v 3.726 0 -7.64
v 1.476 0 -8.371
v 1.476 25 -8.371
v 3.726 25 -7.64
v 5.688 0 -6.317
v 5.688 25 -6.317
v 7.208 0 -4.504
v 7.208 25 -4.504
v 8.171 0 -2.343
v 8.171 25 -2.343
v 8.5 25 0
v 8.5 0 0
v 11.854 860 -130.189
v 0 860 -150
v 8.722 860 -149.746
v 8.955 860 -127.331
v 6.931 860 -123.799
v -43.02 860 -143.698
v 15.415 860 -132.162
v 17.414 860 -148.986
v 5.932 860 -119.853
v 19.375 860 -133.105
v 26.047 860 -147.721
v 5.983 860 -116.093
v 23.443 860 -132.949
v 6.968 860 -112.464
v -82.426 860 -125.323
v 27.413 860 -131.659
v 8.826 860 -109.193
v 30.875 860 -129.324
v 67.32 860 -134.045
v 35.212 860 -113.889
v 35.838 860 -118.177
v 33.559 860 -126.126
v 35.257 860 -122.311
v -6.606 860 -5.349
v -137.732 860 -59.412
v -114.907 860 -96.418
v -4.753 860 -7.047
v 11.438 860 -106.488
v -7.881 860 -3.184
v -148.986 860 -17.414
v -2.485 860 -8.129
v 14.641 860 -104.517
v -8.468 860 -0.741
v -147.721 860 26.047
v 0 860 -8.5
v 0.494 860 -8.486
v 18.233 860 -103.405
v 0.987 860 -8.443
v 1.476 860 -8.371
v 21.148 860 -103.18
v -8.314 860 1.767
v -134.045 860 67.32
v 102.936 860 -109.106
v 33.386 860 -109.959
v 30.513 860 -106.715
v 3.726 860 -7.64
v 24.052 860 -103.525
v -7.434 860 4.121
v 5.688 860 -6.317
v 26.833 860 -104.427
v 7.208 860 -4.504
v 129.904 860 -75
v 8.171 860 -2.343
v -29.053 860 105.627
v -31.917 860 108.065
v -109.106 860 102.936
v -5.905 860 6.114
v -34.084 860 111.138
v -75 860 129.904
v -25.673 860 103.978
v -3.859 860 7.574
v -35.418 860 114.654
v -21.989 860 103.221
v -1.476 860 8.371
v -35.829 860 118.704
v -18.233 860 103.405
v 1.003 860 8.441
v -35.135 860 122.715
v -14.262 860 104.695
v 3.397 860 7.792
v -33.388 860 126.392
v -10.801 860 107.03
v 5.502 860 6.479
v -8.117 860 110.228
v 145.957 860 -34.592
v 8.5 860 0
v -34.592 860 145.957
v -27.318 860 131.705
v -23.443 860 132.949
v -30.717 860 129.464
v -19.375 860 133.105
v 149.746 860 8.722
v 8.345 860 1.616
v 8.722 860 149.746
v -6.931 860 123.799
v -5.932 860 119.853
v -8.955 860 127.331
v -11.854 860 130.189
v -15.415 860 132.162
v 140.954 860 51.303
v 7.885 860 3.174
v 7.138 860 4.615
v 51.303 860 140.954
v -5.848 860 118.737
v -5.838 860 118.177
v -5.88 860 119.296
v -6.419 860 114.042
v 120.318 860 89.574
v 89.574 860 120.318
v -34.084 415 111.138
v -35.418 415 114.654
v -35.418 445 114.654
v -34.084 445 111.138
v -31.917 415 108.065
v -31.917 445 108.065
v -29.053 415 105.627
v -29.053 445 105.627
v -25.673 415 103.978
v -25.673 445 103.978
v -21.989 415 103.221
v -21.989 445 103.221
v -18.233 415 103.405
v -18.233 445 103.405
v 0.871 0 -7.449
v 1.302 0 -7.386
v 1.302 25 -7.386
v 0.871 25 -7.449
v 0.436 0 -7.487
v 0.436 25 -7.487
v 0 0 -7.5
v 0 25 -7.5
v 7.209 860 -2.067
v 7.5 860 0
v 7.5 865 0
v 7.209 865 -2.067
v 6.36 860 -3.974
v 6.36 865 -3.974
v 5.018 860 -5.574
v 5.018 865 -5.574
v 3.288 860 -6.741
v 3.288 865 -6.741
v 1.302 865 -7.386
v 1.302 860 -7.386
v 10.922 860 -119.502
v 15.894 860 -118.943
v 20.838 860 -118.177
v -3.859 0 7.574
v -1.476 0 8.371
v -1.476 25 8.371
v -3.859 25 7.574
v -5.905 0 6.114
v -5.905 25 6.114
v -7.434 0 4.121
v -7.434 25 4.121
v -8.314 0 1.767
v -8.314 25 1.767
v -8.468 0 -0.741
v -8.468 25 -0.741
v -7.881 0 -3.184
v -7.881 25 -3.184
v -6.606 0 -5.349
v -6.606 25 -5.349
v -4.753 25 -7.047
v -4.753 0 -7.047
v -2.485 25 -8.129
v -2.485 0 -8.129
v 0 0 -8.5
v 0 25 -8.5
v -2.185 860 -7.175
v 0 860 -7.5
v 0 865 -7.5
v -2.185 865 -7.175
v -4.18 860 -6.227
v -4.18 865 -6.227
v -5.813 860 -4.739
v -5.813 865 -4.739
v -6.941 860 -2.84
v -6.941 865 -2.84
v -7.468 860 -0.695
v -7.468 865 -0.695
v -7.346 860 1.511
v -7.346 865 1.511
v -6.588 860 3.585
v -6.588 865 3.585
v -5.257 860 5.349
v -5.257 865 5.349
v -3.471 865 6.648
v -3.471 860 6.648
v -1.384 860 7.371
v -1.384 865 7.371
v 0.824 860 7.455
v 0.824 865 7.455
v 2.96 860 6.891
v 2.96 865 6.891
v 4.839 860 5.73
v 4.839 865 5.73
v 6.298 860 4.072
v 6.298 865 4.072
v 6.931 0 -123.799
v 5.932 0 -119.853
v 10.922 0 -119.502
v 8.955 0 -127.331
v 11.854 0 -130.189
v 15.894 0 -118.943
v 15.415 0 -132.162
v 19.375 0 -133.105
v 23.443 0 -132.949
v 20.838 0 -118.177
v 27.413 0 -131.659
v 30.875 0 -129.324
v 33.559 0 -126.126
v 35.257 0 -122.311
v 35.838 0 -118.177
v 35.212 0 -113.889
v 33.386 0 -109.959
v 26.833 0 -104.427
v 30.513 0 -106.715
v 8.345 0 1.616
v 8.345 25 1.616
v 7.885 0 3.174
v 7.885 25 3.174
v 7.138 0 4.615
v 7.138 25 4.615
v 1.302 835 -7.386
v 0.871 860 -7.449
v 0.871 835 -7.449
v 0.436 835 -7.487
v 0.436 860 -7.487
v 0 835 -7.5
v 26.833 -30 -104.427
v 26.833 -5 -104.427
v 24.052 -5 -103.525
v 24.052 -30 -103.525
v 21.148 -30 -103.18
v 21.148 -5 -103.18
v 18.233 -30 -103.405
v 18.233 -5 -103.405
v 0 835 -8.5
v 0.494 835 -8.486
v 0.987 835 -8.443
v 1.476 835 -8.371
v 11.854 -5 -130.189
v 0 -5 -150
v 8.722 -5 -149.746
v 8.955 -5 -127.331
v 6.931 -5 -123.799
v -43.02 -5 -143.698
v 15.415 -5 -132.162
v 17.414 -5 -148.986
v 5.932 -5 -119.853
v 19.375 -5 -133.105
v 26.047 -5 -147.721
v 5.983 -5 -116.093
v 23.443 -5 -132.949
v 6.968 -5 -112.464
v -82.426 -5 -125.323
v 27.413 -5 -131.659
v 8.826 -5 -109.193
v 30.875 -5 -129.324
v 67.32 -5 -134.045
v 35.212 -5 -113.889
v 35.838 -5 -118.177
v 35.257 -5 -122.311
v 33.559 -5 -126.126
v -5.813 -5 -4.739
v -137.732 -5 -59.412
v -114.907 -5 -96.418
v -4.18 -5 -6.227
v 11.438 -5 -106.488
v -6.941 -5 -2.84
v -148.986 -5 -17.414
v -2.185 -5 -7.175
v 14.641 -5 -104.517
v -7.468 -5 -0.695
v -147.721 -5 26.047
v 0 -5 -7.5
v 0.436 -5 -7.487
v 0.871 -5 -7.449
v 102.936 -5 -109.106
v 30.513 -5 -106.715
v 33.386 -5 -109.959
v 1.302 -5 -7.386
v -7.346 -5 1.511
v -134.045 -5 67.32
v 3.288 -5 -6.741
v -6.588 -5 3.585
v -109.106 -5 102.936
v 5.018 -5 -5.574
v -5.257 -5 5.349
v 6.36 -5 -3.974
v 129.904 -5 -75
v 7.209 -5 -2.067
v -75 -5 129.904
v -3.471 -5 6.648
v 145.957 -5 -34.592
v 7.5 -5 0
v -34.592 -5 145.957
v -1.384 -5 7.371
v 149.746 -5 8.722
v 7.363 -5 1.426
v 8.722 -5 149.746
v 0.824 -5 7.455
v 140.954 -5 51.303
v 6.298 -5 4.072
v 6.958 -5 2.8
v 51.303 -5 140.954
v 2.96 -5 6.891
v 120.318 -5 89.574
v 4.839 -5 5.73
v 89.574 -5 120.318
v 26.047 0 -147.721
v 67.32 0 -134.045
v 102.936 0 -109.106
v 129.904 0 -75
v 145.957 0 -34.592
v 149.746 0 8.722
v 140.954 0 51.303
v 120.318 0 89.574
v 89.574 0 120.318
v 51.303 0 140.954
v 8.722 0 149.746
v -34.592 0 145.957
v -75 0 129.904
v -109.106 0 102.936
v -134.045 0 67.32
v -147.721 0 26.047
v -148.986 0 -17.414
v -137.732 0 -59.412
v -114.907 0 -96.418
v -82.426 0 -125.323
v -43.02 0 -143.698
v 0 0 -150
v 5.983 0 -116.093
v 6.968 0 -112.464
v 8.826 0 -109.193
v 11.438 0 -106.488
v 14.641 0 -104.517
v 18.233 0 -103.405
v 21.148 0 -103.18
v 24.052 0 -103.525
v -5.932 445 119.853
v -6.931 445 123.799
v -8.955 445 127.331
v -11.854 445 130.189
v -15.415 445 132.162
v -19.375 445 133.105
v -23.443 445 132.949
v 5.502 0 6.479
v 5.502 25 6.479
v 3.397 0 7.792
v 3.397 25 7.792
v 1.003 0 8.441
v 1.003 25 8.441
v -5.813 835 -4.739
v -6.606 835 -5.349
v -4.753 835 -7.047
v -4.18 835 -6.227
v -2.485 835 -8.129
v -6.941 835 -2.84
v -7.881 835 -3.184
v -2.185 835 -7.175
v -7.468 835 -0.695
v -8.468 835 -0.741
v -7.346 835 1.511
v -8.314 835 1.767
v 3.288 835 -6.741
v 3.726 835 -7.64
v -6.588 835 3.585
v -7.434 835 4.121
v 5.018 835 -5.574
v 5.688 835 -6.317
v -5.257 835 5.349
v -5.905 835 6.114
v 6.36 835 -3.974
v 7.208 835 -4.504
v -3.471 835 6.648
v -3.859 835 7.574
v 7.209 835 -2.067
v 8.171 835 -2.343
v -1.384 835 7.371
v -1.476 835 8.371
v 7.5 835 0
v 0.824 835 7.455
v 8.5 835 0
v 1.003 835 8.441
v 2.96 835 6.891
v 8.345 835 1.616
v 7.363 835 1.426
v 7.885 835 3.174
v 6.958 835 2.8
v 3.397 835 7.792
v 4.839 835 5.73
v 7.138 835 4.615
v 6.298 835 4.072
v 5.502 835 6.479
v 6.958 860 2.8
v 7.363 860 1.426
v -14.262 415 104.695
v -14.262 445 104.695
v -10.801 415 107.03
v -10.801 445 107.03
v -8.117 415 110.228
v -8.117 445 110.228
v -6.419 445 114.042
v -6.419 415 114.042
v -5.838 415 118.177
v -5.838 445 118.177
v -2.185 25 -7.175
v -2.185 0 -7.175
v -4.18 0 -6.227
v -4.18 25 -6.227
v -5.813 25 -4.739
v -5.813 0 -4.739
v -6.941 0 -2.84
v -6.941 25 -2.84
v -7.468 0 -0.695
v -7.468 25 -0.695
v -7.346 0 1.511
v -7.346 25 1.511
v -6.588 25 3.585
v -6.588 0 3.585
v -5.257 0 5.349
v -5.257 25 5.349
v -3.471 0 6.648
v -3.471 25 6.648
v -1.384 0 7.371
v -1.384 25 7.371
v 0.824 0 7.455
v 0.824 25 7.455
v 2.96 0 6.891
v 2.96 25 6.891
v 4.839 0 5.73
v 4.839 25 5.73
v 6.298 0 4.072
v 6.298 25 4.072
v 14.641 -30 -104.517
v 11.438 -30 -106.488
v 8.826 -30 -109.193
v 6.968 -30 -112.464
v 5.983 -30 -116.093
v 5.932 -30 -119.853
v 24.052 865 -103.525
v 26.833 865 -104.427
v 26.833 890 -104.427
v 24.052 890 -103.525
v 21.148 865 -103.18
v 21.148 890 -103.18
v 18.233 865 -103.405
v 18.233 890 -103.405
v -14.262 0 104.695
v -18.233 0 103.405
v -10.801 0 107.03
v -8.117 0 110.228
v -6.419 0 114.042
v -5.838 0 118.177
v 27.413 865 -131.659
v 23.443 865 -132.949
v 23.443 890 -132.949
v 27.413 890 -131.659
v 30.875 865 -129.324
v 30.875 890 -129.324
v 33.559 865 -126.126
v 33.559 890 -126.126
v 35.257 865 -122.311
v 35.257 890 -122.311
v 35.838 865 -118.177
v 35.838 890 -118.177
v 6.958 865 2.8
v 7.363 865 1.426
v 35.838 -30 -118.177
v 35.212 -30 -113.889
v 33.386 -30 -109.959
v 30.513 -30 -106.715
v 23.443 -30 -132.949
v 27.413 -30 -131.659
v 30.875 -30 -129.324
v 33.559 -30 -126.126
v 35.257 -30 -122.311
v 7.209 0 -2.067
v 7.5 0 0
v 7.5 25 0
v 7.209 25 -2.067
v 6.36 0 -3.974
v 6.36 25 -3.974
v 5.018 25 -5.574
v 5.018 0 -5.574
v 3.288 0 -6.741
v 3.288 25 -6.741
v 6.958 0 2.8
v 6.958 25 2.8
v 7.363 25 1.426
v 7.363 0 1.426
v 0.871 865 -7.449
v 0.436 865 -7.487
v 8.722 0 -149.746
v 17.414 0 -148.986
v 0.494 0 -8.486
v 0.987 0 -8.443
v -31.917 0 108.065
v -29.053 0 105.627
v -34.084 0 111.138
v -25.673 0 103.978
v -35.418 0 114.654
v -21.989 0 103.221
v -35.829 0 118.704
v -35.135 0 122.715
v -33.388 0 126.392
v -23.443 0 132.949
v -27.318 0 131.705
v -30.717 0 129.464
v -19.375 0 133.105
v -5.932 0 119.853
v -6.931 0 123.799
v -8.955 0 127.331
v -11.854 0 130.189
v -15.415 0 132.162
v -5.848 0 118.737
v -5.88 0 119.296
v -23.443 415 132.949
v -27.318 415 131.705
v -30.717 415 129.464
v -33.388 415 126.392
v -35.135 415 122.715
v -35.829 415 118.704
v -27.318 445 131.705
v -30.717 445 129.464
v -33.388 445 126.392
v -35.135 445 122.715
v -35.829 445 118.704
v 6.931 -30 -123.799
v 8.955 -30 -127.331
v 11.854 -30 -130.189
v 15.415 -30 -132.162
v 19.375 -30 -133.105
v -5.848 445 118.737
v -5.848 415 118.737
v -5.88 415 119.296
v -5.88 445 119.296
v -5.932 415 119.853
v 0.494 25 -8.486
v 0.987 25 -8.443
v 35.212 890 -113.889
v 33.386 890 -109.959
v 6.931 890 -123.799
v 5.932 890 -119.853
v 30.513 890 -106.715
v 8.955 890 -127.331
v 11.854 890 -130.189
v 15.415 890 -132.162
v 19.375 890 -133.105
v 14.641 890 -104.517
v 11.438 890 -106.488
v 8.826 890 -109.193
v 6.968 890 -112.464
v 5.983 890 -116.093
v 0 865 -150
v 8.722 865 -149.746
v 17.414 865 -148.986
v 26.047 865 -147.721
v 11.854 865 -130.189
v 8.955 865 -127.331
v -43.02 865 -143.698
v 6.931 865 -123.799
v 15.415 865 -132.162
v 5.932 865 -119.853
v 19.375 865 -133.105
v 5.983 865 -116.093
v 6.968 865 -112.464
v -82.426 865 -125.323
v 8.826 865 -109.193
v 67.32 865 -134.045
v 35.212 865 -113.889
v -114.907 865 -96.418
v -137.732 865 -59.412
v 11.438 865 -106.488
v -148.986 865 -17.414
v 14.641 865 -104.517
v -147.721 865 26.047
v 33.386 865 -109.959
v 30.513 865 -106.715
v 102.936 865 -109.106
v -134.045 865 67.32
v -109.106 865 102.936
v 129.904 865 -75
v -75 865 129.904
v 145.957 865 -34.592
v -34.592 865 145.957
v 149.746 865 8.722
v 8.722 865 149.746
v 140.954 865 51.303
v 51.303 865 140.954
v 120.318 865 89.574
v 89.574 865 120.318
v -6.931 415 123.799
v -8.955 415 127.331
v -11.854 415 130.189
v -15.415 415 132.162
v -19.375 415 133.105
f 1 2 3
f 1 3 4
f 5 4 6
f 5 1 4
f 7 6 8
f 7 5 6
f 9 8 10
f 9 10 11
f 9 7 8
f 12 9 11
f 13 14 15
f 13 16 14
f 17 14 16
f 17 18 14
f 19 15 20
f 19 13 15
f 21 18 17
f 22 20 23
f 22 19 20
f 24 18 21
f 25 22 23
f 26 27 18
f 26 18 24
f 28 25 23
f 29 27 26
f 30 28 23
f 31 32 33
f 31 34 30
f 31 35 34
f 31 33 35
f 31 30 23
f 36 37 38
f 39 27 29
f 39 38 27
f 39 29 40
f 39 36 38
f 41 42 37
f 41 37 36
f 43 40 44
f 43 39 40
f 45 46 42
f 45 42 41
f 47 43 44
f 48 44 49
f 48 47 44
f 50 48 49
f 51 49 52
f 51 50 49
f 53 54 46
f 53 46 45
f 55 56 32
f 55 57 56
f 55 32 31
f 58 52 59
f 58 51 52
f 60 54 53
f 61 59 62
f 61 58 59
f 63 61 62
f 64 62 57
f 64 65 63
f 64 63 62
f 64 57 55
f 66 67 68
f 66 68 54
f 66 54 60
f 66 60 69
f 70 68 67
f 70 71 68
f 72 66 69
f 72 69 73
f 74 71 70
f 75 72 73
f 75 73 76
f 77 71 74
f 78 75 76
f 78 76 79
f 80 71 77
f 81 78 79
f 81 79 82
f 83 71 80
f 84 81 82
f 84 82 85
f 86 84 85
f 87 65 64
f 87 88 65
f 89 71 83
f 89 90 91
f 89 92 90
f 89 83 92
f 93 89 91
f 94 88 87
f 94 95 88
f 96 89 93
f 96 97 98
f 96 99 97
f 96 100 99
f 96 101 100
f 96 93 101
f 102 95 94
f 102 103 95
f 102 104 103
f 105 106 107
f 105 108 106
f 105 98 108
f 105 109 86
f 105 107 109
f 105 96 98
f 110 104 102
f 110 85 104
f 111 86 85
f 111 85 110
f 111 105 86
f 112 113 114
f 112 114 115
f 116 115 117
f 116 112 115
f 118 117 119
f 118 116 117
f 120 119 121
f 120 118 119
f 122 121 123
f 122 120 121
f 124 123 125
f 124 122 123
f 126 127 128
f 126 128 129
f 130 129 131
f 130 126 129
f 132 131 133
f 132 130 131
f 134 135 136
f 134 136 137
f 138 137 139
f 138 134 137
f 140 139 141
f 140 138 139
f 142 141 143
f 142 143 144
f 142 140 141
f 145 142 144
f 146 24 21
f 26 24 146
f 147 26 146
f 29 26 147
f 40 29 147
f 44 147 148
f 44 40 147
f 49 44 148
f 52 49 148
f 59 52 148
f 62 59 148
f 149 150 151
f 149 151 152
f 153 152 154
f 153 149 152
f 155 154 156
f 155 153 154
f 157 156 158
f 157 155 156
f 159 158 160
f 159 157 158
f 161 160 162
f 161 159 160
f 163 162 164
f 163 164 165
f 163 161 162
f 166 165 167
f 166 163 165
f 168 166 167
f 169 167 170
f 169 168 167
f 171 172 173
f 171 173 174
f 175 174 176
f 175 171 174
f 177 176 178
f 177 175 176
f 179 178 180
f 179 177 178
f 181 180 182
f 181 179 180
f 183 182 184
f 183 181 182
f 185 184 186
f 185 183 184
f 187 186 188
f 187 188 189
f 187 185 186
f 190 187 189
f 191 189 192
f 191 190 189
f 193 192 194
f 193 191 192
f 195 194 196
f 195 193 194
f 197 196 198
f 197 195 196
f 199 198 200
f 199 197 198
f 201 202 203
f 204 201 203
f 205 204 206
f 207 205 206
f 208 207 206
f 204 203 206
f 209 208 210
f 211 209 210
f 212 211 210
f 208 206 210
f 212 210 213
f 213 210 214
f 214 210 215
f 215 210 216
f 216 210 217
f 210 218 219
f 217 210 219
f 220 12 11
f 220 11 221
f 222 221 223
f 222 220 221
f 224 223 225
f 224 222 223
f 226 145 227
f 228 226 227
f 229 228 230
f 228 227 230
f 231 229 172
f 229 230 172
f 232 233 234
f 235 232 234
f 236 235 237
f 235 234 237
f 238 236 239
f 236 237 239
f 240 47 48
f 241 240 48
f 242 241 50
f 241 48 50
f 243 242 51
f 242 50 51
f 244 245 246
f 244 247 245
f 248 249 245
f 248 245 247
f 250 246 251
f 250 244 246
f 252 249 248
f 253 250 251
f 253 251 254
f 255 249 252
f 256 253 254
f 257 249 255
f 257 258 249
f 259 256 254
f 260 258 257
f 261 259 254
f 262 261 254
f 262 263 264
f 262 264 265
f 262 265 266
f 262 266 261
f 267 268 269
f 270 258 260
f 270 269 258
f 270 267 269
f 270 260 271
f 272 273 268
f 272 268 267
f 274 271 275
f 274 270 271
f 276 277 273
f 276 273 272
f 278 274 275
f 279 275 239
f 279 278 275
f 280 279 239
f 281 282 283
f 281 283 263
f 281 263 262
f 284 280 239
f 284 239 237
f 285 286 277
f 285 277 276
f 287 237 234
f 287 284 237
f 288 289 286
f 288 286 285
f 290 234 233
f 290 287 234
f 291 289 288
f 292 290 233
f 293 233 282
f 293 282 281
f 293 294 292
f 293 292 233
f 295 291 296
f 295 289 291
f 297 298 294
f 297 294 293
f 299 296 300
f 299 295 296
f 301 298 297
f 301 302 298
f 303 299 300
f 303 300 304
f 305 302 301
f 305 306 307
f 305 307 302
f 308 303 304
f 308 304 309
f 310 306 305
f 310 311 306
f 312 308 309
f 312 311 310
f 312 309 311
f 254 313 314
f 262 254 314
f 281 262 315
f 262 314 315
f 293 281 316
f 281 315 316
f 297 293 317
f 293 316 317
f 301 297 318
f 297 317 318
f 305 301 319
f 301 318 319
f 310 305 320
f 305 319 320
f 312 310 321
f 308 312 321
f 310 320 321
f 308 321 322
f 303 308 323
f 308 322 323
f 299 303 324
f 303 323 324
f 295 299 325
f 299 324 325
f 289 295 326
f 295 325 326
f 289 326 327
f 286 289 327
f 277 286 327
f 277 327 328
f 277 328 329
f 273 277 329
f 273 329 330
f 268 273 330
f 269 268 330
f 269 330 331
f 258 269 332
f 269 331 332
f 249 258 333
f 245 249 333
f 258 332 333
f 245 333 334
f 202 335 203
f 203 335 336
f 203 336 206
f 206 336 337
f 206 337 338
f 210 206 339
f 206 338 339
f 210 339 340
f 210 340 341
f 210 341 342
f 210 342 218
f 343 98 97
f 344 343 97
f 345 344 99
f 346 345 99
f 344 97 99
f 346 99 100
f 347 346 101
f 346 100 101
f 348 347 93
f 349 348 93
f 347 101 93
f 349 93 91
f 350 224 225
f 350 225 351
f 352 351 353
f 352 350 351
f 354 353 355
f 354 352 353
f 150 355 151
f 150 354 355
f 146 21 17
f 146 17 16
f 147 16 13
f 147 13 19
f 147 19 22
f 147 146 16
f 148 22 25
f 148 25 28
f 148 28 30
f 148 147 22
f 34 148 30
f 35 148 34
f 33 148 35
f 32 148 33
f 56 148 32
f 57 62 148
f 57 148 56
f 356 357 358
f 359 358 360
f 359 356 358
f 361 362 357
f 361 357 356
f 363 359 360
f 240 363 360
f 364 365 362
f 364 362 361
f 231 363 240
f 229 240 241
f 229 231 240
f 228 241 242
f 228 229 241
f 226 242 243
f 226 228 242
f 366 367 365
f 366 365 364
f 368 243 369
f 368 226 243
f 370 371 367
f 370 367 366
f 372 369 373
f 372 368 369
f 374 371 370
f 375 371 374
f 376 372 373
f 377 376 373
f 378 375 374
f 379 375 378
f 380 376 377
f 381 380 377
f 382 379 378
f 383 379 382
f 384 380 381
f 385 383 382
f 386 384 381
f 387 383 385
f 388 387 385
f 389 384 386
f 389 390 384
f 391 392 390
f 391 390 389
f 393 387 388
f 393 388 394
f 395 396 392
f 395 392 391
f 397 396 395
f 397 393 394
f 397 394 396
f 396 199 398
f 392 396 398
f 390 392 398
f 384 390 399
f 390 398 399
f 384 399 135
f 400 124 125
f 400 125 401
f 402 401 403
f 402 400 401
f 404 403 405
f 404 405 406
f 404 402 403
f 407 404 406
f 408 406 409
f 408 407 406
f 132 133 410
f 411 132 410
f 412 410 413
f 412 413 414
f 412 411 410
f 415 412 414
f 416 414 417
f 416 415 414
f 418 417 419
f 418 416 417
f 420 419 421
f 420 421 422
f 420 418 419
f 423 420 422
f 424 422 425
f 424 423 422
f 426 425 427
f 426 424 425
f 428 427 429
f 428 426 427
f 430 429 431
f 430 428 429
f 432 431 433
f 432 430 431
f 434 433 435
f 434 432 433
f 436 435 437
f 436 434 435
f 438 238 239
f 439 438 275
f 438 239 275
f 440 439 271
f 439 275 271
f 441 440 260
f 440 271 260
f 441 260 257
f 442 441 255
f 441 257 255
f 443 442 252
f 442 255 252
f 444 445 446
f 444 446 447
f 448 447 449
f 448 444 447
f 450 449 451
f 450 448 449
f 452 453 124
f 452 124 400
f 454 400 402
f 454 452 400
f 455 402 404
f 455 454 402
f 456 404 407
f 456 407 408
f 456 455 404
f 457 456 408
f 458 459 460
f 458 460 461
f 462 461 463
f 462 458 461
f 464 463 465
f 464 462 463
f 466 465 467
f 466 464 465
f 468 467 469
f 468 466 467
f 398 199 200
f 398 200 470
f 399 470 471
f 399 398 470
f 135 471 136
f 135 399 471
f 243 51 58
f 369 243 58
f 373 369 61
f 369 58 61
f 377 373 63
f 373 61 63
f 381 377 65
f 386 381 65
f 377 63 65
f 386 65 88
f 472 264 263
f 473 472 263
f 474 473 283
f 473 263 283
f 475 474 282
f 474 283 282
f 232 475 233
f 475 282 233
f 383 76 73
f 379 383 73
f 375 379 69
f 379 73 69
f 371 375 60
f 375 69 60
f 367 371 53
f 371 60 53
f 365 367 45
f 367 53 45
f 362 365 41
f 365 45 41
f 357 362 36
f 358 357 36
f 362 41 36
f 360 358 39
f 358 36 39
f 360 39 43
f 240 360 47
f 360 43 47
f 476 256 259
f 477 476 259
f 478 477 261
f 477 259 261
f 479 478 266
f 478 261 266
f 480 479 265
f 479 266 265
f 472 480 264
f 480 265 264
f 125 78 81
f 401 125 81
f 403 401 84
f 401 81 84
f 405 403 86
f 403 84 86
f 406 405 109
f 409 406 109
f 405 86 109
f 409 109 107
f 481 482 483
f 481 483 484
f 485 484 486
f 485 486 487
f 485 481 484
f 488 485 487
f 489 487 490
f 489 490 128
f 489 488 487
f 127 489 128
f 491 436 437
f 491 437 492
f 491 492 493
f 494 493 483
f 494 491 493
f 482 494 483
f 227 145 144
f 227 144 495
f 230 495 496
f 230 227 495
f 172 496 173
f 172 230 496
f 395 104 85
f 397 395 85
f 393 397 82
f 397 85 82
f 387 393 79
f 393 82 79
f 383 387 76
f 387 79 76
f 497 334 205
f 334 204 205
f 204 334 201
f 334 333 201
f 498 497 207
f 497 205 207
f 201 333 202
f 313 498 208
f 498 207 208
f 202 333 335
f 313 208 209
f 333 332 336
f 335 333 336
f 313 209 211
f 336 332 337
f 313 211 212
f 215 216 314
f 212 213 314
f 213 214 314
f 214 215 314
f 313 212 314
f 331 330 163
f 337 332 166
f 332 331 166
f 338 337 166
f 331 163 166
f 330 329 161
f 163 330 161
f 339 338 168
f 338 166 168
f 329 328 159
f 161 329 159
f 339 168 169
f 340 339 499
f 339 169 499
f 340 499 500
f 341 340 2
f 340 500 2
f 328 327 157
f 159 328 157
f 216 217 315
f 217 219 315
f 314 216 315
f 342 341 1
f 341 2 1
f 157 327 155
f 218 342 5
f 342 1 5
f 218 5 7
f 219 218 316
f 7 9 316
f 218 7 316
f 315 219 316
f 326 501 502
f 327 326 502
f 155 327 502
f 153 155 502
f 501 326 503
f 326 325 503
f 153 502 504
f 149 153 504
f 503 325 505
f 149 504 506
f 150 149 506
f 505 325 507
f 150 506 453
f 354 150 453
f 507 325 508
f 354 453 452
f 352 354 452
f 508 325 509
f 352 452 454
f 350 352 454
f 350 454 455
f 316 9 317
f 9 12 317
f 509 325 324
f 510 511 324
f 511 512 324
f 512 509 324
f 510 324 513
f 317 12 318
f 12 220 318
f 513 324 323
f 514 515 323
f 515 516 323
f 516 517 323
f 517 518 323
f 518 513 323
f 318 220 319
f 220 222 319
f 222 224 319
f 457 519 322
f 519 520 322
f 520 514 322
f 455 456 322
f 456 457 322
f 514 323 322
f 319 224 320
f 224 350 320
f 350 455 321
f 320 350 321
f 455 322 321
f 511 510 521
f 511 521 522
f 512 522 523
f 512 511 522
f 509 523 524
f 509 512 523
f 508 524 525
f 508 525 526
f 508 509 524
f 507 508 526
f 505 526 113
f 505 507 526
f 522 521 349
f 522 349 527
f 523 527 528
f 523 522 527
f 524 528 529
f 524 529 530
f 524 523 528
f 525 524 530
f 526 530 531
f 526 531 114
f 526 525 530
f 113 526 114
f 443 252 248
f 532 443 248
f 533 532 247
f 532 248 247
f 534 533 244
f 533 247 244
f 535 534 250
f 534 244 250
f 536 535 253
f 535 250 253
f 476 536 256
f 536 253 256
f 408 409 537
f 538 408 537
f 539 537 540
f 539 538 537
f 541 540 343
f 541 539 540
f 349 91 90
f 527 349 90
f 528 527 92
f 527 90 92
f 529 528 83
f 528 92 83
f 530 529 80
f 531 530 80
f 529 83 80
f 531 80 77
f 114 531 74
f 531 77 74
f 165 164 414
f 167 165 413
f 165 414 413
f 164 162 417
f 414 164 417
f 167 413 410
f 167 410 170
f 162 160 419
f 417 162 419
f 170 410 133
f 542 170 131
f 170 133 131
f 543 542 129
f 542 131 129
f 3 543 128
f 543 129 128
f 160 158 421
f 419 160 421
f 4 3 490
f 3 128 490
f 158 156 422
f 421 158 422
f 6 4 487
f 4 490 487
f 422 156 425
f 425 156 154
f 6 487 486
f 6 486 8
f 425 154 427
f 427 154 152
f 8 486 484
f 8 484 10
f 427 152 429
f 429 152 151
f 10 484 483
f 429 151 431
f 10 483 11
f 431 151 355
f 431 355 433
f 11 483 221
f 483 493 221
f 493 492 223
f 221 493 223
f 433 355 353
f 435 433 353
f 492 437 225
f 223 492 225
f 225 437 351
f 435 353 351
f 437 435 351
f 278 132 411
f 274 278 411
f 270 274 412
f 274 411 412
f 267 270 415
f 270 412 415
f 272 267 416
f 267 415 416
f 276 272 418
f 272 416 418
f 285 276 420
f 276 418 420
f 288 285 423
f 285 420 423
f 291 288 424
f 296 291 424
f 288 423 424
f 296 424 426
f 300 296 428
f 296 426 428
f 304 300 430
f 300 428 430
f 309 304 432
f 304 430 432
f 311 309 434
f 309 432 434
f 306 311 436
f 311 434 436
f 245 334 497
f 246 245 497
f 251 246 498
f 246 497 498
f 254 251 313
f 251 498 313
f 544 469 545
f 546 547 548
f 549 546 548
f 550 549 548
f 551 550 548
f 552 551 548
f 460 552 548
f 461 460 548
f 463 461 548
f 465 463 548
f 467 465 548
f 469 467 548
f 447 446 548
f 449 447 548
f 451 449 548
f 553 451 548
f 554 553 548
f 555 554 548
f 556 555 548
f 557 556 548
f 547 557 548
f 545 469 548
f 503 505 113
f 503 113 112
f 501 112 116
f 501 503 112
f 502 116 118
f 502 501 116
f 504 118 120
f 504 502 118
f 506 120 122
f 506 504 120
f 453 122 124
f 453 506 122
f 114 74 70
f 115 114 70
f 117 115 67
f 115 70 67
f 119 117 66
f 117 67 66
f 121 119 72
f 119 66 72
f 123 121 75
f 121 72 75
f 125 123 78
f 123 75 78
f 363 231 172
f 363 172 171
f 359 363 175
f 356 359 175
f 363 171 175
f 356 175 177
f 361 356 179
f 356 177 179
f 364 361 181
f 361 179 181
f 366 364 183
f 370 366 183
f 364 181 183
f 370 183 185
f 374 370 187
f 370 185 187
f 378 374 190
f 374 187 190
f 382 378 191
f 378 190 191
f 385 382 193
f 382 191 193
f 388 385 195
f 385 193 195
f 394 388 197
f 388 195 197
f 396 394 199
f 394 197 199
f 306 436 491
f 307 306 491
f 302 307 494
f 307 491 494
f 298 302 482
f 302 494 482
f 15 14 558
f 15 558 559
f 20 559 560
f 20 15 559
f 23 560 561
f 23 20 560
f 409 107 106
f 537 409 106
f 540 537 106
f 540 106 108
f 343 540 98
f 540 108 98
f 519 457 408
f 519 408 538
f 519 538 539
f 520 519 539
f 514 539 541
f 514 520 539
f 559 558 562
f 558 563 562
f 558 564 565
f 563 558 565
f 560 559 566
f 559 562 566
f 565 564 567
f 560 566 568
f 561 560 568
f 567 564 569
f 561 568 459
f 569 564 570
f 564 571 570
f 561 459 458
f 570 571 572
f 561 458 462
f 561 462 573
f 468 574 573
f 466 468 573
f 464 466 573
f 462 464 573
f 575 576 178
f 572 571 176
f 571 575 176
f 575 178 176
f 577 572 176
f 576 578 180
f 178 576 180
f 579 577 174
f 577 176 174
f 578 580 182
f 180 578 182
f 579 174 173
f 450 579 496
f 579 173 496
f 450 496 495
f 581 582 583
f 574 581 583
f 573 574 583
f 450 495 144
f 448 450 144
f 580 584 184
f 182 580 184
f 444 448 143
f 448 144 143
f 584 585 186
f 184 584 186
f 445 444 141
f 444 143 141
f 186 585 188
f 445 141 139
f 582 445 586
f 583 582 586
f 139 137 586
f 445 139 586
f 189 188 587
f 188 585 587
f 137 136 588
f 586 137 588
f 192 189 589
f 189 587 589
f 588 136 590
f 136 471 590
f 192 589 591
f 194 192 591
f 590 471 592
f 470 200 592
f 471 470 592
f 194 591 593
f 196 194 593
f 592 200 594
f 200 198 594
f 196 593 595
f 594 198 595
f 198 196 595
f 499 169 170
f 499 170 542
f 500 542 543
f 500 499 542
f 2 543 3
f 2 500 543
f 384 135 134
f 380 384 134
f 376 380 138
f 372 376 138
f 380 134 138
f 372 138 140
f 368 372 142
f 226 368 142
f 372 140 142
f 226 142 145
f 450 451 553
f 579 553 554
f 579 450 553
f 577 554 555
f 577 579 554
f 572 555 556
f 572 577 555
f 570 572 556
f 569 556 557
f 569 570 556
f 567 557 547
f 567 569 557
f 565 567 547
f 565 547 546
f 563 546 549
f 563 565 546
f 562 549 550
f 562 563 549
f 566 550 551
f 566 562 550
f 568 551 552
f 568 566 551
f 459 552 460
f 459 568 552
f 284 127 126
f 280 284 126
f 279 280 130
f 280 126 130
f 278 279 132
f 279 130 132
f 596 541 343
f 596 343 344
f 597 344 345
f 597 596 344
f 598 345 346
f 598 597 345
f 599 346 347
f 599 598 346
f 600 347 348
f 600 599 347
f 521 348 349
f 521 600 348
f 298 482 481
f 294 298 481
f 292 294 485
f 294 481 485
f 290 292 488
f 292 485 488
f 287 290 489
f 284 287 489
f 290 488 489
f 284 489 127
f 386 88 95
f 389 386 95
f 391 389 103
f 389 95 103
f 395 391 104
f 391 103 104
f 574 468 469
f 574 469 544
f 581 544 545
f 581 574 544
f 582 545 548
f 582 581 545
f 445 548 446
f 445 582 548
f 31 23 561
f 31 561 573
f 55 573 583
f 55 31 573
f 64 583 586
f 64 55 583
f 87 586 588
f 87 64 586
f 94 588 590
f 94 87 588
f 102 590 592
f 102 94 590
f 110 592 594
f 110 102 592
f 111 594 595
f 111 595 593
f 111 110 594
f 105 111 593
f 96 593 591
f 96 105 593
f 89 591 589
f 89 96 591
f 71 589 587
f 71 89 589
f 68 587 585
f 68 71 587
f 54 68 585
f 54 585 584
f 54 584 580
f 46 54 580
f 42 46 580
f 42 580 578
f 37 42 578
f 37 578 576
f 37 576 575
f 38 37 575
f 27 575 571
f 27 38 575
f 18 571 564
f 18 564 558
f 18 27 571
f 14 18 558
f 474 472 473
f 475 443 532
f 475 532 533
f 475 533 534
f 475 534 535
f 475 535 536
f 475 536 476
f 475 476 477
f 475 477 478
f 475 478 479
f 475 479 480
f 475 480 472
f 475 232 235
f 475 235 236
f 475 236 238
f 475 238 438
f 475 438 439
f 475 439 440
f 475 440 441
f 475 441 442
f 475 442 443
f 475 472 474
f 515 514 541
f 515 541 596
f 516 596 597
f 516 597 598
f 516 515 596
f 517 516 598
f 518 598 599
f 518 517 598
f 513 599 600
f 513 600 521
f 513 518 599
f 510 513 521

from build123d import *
from build123d import SkipClean  # not in build123d's __all__

# Parameters (mm, degrees)
F1_DEPTH = 25
F2_DEPTH = 445
F3_DEPTH = 30
F4_DEPTH = 5


# Not quite as in the source:
# - after a boolean that leaves OpenCascade's solid faulty, fix() repairs it


with BuildPart() as f1:
    # F0 (on Front) → F1 (new body)
    with BuildSketch(Plane.XZ):
        with BuildLine():
            ThreePointArc((1.4760095102, -8.3708659006), (6.5113777665, -5.4636946823), (8.5, 0))
            Line((8.5, 0), (7.5, 0))
            ThreePointArc((7.5, 0), (5.7453333234, -4.8209070726), (1.3023613325, -7.3860581476))
            Line((1.3023613325, -7.3860581476), (1.4760095102, -8.3708659006))
        make_face()
        with BuildLine():
            Line((7.5, 0), (8.5, 0))
            ThreePointArc((8.5, 0), (8.1523783886, 2.405977267), (7.1379466801, 4.6151616647))
            Line((7.1379466801, 4.6151616647), (6.2981882472, 4.0722014689))
            ThreePointArc((6.2981882472, 4.0722014689), (7.1932750487, 2.122921118), (7.5, 0))
        make_face()
        with BuildLine():
            ThreePointArc((-1.4760095102, 8.3708659006), (-8.4676549338, -0.7408238134), (0, -8.5))
            Line((0, -8.5), (0, -7.5))
            ThreePointArc((0, -7.5), (-7.4714602357, -0.6536680706), (-1.3023613325, 7.3860581476))
            Line((-1.3023613325, 7.3860581476), (-1.4760095102, 8.3708659006))
        make_face()
        with BuildLine():
            Line((0, -7.5), (0, -8.5))
            ThreePointArc((0, -8.5), (0.7408238134, -8.4676549338), (1.4760095102, -8.3708659006))
            Line((1.4760095102, -8.3708659006), (1.3023613325, -7.3860581476))
            ThreePointArc((1.3023613325, -7.3860581476), (0.6536680706, -7.4714602357), (0, -7.5))
        make_face()
        with BuildLine():
            Line((6.2981882472, 4.0722014689), (7.1379466801, 4.6151616647))
            ThreePointArc((7.1379466801, 4.6151616647), (3.397162302, 7.7916165392), (-1.4760095102, 8.3708659006))
            Line((-1.4760095102, 8.3708659006), (-1.3023613325, 7.3860581476))
            ThreePointArc((-1.3023613325, 7.3860581476), (2.9974961488, 6.8749557699), (6.2981882472, 4.0722014689))
        make_face()
    extrude(amount=-F1_DEPTH)



with BuildPart() as f2:
    # F0 (on Front) → F2 (new body)
    with BuildSketch(Plane.XZ):
        with BuildLine():
            ThreePointArc((-5.9317498787, 119.8533034312), (-11.8541755818, 130.1892085775), (-23.442503985, 132.9490466566))
            Line((-23.442503985, 132.9490466566), (-20.83778132, 118.1769303615))
            ThreePointArc((-20.83778132, 118.1769303615), (-13.4109845581, 119.2482515309), (-5.9317498787, 119.8533034312))
        make_face()
        with BuildLine():
            Line((-20.83778132, 118.1769303615), (-23.442503985, 132.9490466566))
            ThreePointArc((-23.442503985, 132.9490466566), (-33.3880504574, 126.3922054378), (-35.4182224283, 114.6540427548))
            ThreePointArc((-35.4182224283, 114.6540427548), (-28.1831008533, 116.6435288659), (-20.83778132, 118.1769303615))
        make_face()
        with BuildLine():
            ThreePointArc((-5.9317498787, 119.8533034312), (-13.4109845581, 119.2482515309), (-20.83778132, 118.1769303615))
            Line((-20.83778132, 118.1769303615), (-18.233058655, 103.4048140663))
            ThreePointArc((-18.233058655, 103.4048140663), (-9.3471146732, 108.5351162162), (-5.83778132, 118.1769303615))
            ThreePointArc((-5.83778132, 118.1769303615), (-5.8612918846, 119.016432708), (-5.9317498787, 119.8533034312))
        make_face()
        with BuildLine():
            Line((-18.233058655, 103.4048140663), (-20.83778132, 118.1769303615))
            ThreePointArc((-20.83778132, 118.1769303615), (-28.1831008533, 116.6435288659), (-35.4182224283, 114.6540427548))
            ThreePointArc((-35.4182224283, 114.6540427548), (-29.0530563964, 105.6266612241), (-18.233058655, 103.4048140663))
        make_face()
    extrude(amount=-F2_DEPTH)


with BuildPart() as f3:
    # F0 (on Front) → F3 (new body)
    with BuildSketch(Plane.XZ):
        with BuildLine():
            ThreePointArc((5.9317498787, -119.8533034312), (11.8541755818, -130.1892085775), (23.442503985, -132.9490466566))
            Line((23.442503985, -132.9490466566), (20.83778132, -118.1769303615))
            ThreePointArc((20.83778132, -118.1769303615), (13.4109845581, -119.2482515309), (5.9317498787, -119.8533034312))
        make_face()
        with BuildLine():
            Line((20.83778132, -118.1769303615), (23.442503985, -132.9490466566))
            ThreePointArc((23.442503985, -132.9490466566), (32.3284479668, -127.8187445068), (35.83778132, -118.1769303615))
            ThreePointArc((35.83778132, -118.1769303615), (35.7325222816, -116.4030386826), (35.4182224283, -114.6540427548))
            ThreePointArc((35.4182224283, -114.6540427548), (28.1831008533, -116.6435288659), (20.83778132, -118.1769303615))
        make_face()
        with BuildLine():
            ThreePointArc((20.83778132, -118.1769303615), (28.1831008533, -116.6435288659), (35.4182224283, -114.6540427548))
            ThreePointArc((35.4182224283, -114.6540427548), (32.3262590082, -108.5325081181), (26.8327736176, -104.4270188217))
            Line((26.8327736176, -104.4270188217), (20.83778132, -118.1769303615))
        make_face()
        with BuildLine():
            Line((18.233058655, -103.4048140663), (20.83778132, -118.1769303615))
            Line((20.83778132, -118.1769303615), (26.8327736176, -104.4270188217))
            ThreePointArc((26.8327736176, -104.4270188217), (22.6082918921, -103.2817871156), (18.233058655, -103.4048140663))
        make_face()
        with BuildLine():
            ThreePointArc((5.9317498787, -119.8533034312), (13.4109845581, -119.2482515309), (20.83778132, -118.1769303615))
            Line((20.83778132, -118.1769303615), (18.233058655, -103.4048140663))
            ThreePointArc((18.233058655, -103.4048140663), (8.8255031039, -109.1933246233), (5.9317498787, -119.8533034312))
        make_face()
    extrude(amount=F3_DEPTH)


with BuildPart() as f1_1:
    add(f1.part, clean=False)

    with SkipClean():  # cleaning this boolean's faces spoils the solid; the shape is the same uncleaned
        add(f2.part)  # F4 merges F2

    with SkipClean():  # cleaning this boolean's faces spoils the solid; the shape is the same uncleaned
        add(f3.part)  # F4 merges F3
    # F0 (on Front) → F4 (join)
    with BuildSketch(Plane.XZ):
        with BuildLine():
            Line((120, 0), (150, 0))
            ThreePointArc((150, 0), (143.8655009749, 42.4584223594), (125.9637649434, 81.4440293778))
            Line((125.9637649434, 81.4440293778), (113.367388449, 73.29962644))
            ThreePointArc((113.367388449, 73.29962644), (115.1575620522, 69.4010657382), (115.7710119547, 65.1552235022))
            ThreePointArc((115.7710119547, 65.1552235022), (113.7154721999, 57.5762427686), (108.11221876, 52.0744481949))
            ThreePointArc((108.11221876, 52.0744481949), (116.9903121015, 26.7070566406), (120, 0))
        make_face()
        with BuildLine():
            ThreePointArc((26.04722665, -147.7211629518), (114.9066664678, -96.418141453), (150, 0))
            Line((150, 0), (120, 0))
            ThreePointArc((120, 0), (96.5665229036, -71.2383790825), (35.4182224283, -114.6540427548))
            ThreePointArc((35.4182224283, -114.6540427548), (35.7325222816, -116.4030386826), (35.83778132, -118.1769303615))
            ThreePointArc((35.83778132, -118.1769303615), (32.3284479668, -127.8187445068), (23.442503985, -132.9490466566))
            Line((23.442503985, -132.9490466566), (26.04722665, -147.7211629518))
        make_face()
        with BuildLine():
            Line((113.367388449, 73.29962644), (125.9637649434, 81.4440293778))
            ThreePointArc((125.9637649434, 81.4440293778), (59.949922976, 137.4991153978), (-26.04722665, 147.7211629518))
            Line((-26.04722665, 147.7211629518), (-23.442503985, 132.9490466566))
            ThreePointArc((-23.442503985, 132.9490466566), (-11.8541755818, 130.1892085775), (-5.9317498787, 119.8533034312))
            ThreePointArc((-5.9317498787, 119.8533034312), (47.9599383808, 109.9992923182), (91.8552580876, 77.2179484424))
            ThreePointArc((91.8552580876, 77.2179484424), (103.4589586729, 79.9124231838), (113.367388449, 73.29962644))
        make_face()
        with BuildLine():
            ThreePointArc((0, -150), (13.0733614121, -149.4292047138), (26.04722665, -147.7211629518))
            Line((26.04722665, -147.7211629518), (23.442503985, -132.9490466566))
            ThreePointArc((23.442503985, -132.9490466566), (11.8541755818, -130.1892085775), (5.9317498787, -119.8533034312))
            ThreePointArc((5.9317498787, -119.8533034312), (2.9667817794, -119.963320252), (0, -120))
            Line((0, -120), (0, -150))
        make_face()
        with BuildLine():
            ThreePointArc((35.4182224283, -114.6540427548), (96.5665229036, -71.2383790825), (120, 0))
            Line((120, 0), (72.3631882451, 0))
            Line((72.3631882451, 0), (26.8327736176, -104.4270188217))
            ThreePointArc((26.8327736176, -104.4270188217), (32.3262590082, -108.5325081181), (35.4182224283, -114.6540427548))
        make_face()
        with BuildLine():
            Line((72.3631882451, 0), (120, 0))
            ThreePointArc((120, 0), (116.9903121015, 26.7070566406), (108.11221876, 52.0744481949))
            ThreePointArc((108.11221876, 52.0744481949), (101.522682893, 50.1740689806), (94.7760196571, 51.4053119625))
            Line((94.7760196571, 51.4053119625), (72.3631882451, 0))
        make_face()
        with BuildLine():
            Line((-23.442503985, 132.9490466566), (-26.04722665, 147.7211629518))
            ThreePointArc((-26.04722665, 147.7211629518), (-149.4292047138, -13.0733614122), (0, -150))
            Line((0, -150), (0, -120))
            ThreePointArc((0, -120), (-118.6559841107, -17.9097022508), (-35.4182224283, 114.6540427548))
            ThreePointArc((-35.4182224283, 114.6540427548), (-33.3880504574, 126.3922054378), (-23.442503985, 132.9490466566))
        make_face()
        with BuildLine():
            ThreePointArc((115.7710119547, 65.1552235022), (115.1575620522, 69.4010657382), (113.367388449, 73.29962644))
            Line((113.367388449, 73.29962644), (100.7710119547, 65.1552235022))
            ThreePointArc((100.7710119547, 65.1552235022), (104.6462024591, 58.7296544421), (108.11221876, 52.0744481949))
            ThreePointArc((108.11221876, 52.0744481949), (113.7154721999, 57.5762427686), (115.7710119547, 65.1552235022))
        make_face()
        with BuildLine():
            Line((100.7710119547, 65.1552235022), (113.367388449, 73.29962644))
            ThreePointArc((113.367388449, 73.29962644), (103.4589586729, 79.9124231838), (91.8552580876, 77.2179484424))
            ThreePointArc((91.8552580876, 77.2179484424), (96.5017995213, 71.3260309365), (100.7710119547, 65.1552235022))
        make_face()
        with BuildLine():
            Line((26.8327736176, -104.4270188217), (72.3631882451, 0))
            Line((72.3631882451, 0), (8.5, 0))
            ThreePointArc((8.5, 0), (6.5113777665, -5.4636946823), (1.4760095102, -8.3708659006))
            Line((1.4760095102, -8.3708659006), (18.233058655, -103.4048140663))
            ThreePointArc((18.233058655, -103.4048140663), (22.6082918921, -103.2817871156), (26.8327736176, -104.4270188217))
        make_face()
        with BuildLine():
            Line((8.5, 0), (72.3631882451, 0))
            Line((72.3631882451, 0), (94.7760196571, 51.4053119625))
            ThreePointArc((94.7760196571, 51.4053119625), (91.0619862538, 53.7212906732), (88.1746354604, 57.0108205645))
            Line((88.1746354604, 57.0108205645), (7.1379466801, 4.6151616647))
            ThreePointArc((7.1379466801, 4.6151616647), (8.1523783886, 2.405977267), (8.5, 0))
        make_face()
        with BuildLine():
            ThreePointArc((94.7760196571, 51.4053119625), (101.522682893, 50.1740689806), (108.11221876, 52.0744481949))
            ThreePointArc((108.11221876, 52.0744481949), (104.6462024591, 58.7296544421), (100.7710119547, 65.1552235022))
            Line((100.7710119547, 65.1552235022), (94.7760196571, 51.4053119625))
        make_face()
        with BuildLine():
            ThreePointArc((-5.9317498787, 119.8533034312), (-11.8541755818, 130.1892085775), (-23.442503985, 132.9490466566))
            Line((-23.442503985, 132.9490466566), (-20.83778132, 118.1769303615))
            ThreePointArc((-20.83778132, 118.1769303615), (-13.4109845581, 119.2482515309), (-5.9317498787, 119.8533034312))
        make_face()
        with BuildLine():
            Line((-20.83778132, 118.1769303615), (-23.442503985, 132.9490466566))
            ThreePointArc((-23.442503985, 132.9490466566), (-33.3880504574, 126.3922054378), (-35.4182224283, 114.6540427548))
            ThreePointArc((-35.4182224283, 114.6540427548), (-28.1831008533, 116.6435288659), (-20.83778132, 118.1769303615))
        make_face()
        with BuildLine():
            Line((94.7760196571, 51.4053119625), (100.7710119547, 65.1552235022))
            Line((100.7710119547, 65.1552235022), (88.1746354604, 57.0108205645))
            ThreePointArc((88.1746354604, 57.0108205645), (91.0619862538, 53.7212906732), (94.7760196571, 51.4053119625))
        make_face()
        with BuildLine():
            Line((88.1746354604, 57.0108205645), (100.7710119547, 65.1552235022))
            ThreePointArc((100.7710119547, 65.1552235022), (96.5017995213, 71.3260309365), (91.8552580876, 77.2179484424))
            ThreePointArc((91.8552580876, 77.2179484424), (86.0138122732, 67.8431702204), (88.1746354604, 57.0108205645))
        make_face()
        with BuildLine():
            ThreePointArc((88.1746354604, 57.0108205645), (86.0138122732, 67.8431702204), (91.8552580876, 77.2179484424))
            ThreePointArc((91.8552580876, 77.2179484424), (47.9599383808, 109.9992923182), (-5.9317498787, 119.8533034312))
            ThreePointArc((-5.9317498787, 119.8533034312), (-5.8612918846, 119.016432708), (-5.83778132, 118.1769303615))
            ThreePointArc((-5.83778132, 118.1769303615), (-9.3471146732, 108.5351162162), (-18.233058655, 103.4048140663))
            Line((-18.233058655, 103.4048140663), (-1.4760095102, 8.3708659006))
            ThreePointArc((-1.4760095102, 8.3708659006), (3.397162302, 7.7916165392), (7.1379466801, 4.6151616647))
            Line((7.1379466801, 4.6151616647), (88.1746354604, 57.0108205645))
        make_face()
        with BuildLine():
            ThreePointArc((-35.4182224283, 114.6540427548), (-118.6559841107, -17.9097022508), (0, -120))
            Line((0, -120), (0, -8.5))
            ThreePointArc((0, -8.5), (-8.4676549338, -0.7408238134), (-1.4760095102, 8.3708659006))
            Line((-1.4760095102, 8.3708659006), (-18.233058655, 103.4048140663))
            ThreePointArc((-18.233058655, 103.4048140663), (-29.0530563964, 105.6266612241), (-35.4182224283, 114.6540427548))
        make_face()
        with BuildLine():
            Line((0, -8.5), (0, -120))
            ThreePointArc((0, -120), (2.9667817794, -119.963320252), (5.9317498787, -119.8533034312))
            ThreePointArc((5.9317498787, -119.8533034312), (8.8255031039, -109.1933246233), (18.233058655, -103.4048140663))
            Line((18.233058655, -103.4048140663), (1.4760095102, -8.3708659006))
            ThreePointArc((1.4760095102, -8.3708659006), (0.7408238134, -8.4676549338), (0, -8.5))
        make_face()
        with BuildLine():
            Line((18.233058655, -103.4048140663), (20.83778132, -118.1769303615))
            Line((20.83778132, -118.1769303615), (26.8327736176, -104.4270188217))
            ThreePointArc((26.8327736176, -104.4270188217), (22.6082918921, -103.2817871156), (18.233058655, -103.4048140663))
        make_face()
        with BuildLine():
            ThreePointArc((5.9317498787, -119.8533034312), (13.4109845581, -119.2482515309), (20.83778132, -118.1769303615))
            Line((20.83778132, -118.1769303615), (18.233058655, -103.4048140663))
            ThreePointArc((18.233058655, -103.4048140663), (8.8255031039, -109.1933246233), (5.9317498787, -119.8533034312))
        make_face()
        with BuildLine():
            ThreePointArc((1.4760095102, -8.3708659006), (6.5113777665, -5.4636946823), (8.5, 0))
            Line((8.5, 0), (7.5, 0))
            ThreePointArc((7.5, 0), (5.7453333234, -4.8209070726), (1.3023613325, -7.3860581476))
            Line((1.3023613325, -7.3860581476), (1.4760095102, -8.3708659006))
        make_face()
        with BuildLine():
            Line((7.5, 0), (8.5, 0))
            ThreePointArc((8.5, 0), (8.1523783886, 2.405977267), (7.1379466801, 4.6151616647))
            Line((7.1379466801, 4.6151616647), (6.2981882472, 4.0722014689))
            ThreePointArc((6.2981882472, 4.0722014689), (7.1932750487, 2.122921118), (7.5, 0))
        make_face()
        with BuildLine():
            ThreePointArc((-5.9317498787, 119.8533034312), (-13.4109845581, 119.2482515309), (-20.83778132, 118.1769303615))
            Line((-20.83778132, 118.1769303615), (-18.233058655, 103.4048140663))
            ThreePointArc((-18.233058655, 103.4048140663), (-9.3471146732, 108.5351162162), (-5.83778132, 118.1769303615))
            ThreePointArc((-5.83778132, 118.1769303615), (-5.8612918846, 119.016432708), (-5.9317498787, 119.8533034312))
        make_face()
        with BuildLine():
            Line((-18.233058655, 103.4048140663), (-20.83778132, 118.1769303615))
            ThreePointArc((-20.83778132, 118.1769303615), (-28.1831008533, 116.6435288659), (-35.4182224283, 114.6540427548))
            ThreePointArc((-35.4182224283, 114.6540427548), (-29.0530563964, 105.6266612241), (-18.233058655, 103.4048140663))
        make_face()
        with BuildLine():
            ThreePointArc((-1.4760095102, 8.3708659006), (-8.4676549338, -0.7408238134), (0, -8.5))
            Line((0, -8.5), (0, -7.5))
            ThreePointArc((0, -7.5), (-7.4714602357, -0.6536680706), (-1.3023613325, 7.3860581476))
            Line((-1.3023613325, 7.3860581476), (-1.4760095102, 8.3708659006))
        make_face()
        with BuildLine():
            Line((0, -7.5), (0, -8.5))
            ThreePointArc((0, -8.5), (0.7408238134, -8.4676549338), (1.4760095102, -8.3708659006))
            Line((1.4760095102, -8.3708659006), (1.3023613325, -7.3860581476))
            ThreePointArc((1.3023613325, -7.3860581476), (0.6536680706, -7.4714602357), (0, -7.5))
        make_face()
        with BuildLine():
            Line((6.2981882472, 4.0722014689), (7.1379466801, 4.6151616647))
            ThreePointArc((7.1379466801, 4.6151616647), (3.397162302, 7.7916165392), (-1.4760095102, 8.3708659006))
            Line((-1.4760095102, 8.3708659006), (-1.3023613325, 7.3860581476))
            ThreePointArc((-1.3023613325, 7.3860581476), (2.9974961488, 6.8749557699), (6.2981882472, 4.0722014689))
        make_face()
    with SkipClean():  # cleaning this boolean's faces spoils the solid; the shape is the same uncleaned
        extrude(amount=F4_DEPTH)

    # F6: F1 across plane


with BuildPart() as f1_2:
    add(f1_1.part, clean=False)
    add(f1_1.part.mirror(Plane.XZ.offset(-430)), clean=False)

    add(f1_2.part.fix(), mode=Mode.REPLACE)


solid = f1_2.part
